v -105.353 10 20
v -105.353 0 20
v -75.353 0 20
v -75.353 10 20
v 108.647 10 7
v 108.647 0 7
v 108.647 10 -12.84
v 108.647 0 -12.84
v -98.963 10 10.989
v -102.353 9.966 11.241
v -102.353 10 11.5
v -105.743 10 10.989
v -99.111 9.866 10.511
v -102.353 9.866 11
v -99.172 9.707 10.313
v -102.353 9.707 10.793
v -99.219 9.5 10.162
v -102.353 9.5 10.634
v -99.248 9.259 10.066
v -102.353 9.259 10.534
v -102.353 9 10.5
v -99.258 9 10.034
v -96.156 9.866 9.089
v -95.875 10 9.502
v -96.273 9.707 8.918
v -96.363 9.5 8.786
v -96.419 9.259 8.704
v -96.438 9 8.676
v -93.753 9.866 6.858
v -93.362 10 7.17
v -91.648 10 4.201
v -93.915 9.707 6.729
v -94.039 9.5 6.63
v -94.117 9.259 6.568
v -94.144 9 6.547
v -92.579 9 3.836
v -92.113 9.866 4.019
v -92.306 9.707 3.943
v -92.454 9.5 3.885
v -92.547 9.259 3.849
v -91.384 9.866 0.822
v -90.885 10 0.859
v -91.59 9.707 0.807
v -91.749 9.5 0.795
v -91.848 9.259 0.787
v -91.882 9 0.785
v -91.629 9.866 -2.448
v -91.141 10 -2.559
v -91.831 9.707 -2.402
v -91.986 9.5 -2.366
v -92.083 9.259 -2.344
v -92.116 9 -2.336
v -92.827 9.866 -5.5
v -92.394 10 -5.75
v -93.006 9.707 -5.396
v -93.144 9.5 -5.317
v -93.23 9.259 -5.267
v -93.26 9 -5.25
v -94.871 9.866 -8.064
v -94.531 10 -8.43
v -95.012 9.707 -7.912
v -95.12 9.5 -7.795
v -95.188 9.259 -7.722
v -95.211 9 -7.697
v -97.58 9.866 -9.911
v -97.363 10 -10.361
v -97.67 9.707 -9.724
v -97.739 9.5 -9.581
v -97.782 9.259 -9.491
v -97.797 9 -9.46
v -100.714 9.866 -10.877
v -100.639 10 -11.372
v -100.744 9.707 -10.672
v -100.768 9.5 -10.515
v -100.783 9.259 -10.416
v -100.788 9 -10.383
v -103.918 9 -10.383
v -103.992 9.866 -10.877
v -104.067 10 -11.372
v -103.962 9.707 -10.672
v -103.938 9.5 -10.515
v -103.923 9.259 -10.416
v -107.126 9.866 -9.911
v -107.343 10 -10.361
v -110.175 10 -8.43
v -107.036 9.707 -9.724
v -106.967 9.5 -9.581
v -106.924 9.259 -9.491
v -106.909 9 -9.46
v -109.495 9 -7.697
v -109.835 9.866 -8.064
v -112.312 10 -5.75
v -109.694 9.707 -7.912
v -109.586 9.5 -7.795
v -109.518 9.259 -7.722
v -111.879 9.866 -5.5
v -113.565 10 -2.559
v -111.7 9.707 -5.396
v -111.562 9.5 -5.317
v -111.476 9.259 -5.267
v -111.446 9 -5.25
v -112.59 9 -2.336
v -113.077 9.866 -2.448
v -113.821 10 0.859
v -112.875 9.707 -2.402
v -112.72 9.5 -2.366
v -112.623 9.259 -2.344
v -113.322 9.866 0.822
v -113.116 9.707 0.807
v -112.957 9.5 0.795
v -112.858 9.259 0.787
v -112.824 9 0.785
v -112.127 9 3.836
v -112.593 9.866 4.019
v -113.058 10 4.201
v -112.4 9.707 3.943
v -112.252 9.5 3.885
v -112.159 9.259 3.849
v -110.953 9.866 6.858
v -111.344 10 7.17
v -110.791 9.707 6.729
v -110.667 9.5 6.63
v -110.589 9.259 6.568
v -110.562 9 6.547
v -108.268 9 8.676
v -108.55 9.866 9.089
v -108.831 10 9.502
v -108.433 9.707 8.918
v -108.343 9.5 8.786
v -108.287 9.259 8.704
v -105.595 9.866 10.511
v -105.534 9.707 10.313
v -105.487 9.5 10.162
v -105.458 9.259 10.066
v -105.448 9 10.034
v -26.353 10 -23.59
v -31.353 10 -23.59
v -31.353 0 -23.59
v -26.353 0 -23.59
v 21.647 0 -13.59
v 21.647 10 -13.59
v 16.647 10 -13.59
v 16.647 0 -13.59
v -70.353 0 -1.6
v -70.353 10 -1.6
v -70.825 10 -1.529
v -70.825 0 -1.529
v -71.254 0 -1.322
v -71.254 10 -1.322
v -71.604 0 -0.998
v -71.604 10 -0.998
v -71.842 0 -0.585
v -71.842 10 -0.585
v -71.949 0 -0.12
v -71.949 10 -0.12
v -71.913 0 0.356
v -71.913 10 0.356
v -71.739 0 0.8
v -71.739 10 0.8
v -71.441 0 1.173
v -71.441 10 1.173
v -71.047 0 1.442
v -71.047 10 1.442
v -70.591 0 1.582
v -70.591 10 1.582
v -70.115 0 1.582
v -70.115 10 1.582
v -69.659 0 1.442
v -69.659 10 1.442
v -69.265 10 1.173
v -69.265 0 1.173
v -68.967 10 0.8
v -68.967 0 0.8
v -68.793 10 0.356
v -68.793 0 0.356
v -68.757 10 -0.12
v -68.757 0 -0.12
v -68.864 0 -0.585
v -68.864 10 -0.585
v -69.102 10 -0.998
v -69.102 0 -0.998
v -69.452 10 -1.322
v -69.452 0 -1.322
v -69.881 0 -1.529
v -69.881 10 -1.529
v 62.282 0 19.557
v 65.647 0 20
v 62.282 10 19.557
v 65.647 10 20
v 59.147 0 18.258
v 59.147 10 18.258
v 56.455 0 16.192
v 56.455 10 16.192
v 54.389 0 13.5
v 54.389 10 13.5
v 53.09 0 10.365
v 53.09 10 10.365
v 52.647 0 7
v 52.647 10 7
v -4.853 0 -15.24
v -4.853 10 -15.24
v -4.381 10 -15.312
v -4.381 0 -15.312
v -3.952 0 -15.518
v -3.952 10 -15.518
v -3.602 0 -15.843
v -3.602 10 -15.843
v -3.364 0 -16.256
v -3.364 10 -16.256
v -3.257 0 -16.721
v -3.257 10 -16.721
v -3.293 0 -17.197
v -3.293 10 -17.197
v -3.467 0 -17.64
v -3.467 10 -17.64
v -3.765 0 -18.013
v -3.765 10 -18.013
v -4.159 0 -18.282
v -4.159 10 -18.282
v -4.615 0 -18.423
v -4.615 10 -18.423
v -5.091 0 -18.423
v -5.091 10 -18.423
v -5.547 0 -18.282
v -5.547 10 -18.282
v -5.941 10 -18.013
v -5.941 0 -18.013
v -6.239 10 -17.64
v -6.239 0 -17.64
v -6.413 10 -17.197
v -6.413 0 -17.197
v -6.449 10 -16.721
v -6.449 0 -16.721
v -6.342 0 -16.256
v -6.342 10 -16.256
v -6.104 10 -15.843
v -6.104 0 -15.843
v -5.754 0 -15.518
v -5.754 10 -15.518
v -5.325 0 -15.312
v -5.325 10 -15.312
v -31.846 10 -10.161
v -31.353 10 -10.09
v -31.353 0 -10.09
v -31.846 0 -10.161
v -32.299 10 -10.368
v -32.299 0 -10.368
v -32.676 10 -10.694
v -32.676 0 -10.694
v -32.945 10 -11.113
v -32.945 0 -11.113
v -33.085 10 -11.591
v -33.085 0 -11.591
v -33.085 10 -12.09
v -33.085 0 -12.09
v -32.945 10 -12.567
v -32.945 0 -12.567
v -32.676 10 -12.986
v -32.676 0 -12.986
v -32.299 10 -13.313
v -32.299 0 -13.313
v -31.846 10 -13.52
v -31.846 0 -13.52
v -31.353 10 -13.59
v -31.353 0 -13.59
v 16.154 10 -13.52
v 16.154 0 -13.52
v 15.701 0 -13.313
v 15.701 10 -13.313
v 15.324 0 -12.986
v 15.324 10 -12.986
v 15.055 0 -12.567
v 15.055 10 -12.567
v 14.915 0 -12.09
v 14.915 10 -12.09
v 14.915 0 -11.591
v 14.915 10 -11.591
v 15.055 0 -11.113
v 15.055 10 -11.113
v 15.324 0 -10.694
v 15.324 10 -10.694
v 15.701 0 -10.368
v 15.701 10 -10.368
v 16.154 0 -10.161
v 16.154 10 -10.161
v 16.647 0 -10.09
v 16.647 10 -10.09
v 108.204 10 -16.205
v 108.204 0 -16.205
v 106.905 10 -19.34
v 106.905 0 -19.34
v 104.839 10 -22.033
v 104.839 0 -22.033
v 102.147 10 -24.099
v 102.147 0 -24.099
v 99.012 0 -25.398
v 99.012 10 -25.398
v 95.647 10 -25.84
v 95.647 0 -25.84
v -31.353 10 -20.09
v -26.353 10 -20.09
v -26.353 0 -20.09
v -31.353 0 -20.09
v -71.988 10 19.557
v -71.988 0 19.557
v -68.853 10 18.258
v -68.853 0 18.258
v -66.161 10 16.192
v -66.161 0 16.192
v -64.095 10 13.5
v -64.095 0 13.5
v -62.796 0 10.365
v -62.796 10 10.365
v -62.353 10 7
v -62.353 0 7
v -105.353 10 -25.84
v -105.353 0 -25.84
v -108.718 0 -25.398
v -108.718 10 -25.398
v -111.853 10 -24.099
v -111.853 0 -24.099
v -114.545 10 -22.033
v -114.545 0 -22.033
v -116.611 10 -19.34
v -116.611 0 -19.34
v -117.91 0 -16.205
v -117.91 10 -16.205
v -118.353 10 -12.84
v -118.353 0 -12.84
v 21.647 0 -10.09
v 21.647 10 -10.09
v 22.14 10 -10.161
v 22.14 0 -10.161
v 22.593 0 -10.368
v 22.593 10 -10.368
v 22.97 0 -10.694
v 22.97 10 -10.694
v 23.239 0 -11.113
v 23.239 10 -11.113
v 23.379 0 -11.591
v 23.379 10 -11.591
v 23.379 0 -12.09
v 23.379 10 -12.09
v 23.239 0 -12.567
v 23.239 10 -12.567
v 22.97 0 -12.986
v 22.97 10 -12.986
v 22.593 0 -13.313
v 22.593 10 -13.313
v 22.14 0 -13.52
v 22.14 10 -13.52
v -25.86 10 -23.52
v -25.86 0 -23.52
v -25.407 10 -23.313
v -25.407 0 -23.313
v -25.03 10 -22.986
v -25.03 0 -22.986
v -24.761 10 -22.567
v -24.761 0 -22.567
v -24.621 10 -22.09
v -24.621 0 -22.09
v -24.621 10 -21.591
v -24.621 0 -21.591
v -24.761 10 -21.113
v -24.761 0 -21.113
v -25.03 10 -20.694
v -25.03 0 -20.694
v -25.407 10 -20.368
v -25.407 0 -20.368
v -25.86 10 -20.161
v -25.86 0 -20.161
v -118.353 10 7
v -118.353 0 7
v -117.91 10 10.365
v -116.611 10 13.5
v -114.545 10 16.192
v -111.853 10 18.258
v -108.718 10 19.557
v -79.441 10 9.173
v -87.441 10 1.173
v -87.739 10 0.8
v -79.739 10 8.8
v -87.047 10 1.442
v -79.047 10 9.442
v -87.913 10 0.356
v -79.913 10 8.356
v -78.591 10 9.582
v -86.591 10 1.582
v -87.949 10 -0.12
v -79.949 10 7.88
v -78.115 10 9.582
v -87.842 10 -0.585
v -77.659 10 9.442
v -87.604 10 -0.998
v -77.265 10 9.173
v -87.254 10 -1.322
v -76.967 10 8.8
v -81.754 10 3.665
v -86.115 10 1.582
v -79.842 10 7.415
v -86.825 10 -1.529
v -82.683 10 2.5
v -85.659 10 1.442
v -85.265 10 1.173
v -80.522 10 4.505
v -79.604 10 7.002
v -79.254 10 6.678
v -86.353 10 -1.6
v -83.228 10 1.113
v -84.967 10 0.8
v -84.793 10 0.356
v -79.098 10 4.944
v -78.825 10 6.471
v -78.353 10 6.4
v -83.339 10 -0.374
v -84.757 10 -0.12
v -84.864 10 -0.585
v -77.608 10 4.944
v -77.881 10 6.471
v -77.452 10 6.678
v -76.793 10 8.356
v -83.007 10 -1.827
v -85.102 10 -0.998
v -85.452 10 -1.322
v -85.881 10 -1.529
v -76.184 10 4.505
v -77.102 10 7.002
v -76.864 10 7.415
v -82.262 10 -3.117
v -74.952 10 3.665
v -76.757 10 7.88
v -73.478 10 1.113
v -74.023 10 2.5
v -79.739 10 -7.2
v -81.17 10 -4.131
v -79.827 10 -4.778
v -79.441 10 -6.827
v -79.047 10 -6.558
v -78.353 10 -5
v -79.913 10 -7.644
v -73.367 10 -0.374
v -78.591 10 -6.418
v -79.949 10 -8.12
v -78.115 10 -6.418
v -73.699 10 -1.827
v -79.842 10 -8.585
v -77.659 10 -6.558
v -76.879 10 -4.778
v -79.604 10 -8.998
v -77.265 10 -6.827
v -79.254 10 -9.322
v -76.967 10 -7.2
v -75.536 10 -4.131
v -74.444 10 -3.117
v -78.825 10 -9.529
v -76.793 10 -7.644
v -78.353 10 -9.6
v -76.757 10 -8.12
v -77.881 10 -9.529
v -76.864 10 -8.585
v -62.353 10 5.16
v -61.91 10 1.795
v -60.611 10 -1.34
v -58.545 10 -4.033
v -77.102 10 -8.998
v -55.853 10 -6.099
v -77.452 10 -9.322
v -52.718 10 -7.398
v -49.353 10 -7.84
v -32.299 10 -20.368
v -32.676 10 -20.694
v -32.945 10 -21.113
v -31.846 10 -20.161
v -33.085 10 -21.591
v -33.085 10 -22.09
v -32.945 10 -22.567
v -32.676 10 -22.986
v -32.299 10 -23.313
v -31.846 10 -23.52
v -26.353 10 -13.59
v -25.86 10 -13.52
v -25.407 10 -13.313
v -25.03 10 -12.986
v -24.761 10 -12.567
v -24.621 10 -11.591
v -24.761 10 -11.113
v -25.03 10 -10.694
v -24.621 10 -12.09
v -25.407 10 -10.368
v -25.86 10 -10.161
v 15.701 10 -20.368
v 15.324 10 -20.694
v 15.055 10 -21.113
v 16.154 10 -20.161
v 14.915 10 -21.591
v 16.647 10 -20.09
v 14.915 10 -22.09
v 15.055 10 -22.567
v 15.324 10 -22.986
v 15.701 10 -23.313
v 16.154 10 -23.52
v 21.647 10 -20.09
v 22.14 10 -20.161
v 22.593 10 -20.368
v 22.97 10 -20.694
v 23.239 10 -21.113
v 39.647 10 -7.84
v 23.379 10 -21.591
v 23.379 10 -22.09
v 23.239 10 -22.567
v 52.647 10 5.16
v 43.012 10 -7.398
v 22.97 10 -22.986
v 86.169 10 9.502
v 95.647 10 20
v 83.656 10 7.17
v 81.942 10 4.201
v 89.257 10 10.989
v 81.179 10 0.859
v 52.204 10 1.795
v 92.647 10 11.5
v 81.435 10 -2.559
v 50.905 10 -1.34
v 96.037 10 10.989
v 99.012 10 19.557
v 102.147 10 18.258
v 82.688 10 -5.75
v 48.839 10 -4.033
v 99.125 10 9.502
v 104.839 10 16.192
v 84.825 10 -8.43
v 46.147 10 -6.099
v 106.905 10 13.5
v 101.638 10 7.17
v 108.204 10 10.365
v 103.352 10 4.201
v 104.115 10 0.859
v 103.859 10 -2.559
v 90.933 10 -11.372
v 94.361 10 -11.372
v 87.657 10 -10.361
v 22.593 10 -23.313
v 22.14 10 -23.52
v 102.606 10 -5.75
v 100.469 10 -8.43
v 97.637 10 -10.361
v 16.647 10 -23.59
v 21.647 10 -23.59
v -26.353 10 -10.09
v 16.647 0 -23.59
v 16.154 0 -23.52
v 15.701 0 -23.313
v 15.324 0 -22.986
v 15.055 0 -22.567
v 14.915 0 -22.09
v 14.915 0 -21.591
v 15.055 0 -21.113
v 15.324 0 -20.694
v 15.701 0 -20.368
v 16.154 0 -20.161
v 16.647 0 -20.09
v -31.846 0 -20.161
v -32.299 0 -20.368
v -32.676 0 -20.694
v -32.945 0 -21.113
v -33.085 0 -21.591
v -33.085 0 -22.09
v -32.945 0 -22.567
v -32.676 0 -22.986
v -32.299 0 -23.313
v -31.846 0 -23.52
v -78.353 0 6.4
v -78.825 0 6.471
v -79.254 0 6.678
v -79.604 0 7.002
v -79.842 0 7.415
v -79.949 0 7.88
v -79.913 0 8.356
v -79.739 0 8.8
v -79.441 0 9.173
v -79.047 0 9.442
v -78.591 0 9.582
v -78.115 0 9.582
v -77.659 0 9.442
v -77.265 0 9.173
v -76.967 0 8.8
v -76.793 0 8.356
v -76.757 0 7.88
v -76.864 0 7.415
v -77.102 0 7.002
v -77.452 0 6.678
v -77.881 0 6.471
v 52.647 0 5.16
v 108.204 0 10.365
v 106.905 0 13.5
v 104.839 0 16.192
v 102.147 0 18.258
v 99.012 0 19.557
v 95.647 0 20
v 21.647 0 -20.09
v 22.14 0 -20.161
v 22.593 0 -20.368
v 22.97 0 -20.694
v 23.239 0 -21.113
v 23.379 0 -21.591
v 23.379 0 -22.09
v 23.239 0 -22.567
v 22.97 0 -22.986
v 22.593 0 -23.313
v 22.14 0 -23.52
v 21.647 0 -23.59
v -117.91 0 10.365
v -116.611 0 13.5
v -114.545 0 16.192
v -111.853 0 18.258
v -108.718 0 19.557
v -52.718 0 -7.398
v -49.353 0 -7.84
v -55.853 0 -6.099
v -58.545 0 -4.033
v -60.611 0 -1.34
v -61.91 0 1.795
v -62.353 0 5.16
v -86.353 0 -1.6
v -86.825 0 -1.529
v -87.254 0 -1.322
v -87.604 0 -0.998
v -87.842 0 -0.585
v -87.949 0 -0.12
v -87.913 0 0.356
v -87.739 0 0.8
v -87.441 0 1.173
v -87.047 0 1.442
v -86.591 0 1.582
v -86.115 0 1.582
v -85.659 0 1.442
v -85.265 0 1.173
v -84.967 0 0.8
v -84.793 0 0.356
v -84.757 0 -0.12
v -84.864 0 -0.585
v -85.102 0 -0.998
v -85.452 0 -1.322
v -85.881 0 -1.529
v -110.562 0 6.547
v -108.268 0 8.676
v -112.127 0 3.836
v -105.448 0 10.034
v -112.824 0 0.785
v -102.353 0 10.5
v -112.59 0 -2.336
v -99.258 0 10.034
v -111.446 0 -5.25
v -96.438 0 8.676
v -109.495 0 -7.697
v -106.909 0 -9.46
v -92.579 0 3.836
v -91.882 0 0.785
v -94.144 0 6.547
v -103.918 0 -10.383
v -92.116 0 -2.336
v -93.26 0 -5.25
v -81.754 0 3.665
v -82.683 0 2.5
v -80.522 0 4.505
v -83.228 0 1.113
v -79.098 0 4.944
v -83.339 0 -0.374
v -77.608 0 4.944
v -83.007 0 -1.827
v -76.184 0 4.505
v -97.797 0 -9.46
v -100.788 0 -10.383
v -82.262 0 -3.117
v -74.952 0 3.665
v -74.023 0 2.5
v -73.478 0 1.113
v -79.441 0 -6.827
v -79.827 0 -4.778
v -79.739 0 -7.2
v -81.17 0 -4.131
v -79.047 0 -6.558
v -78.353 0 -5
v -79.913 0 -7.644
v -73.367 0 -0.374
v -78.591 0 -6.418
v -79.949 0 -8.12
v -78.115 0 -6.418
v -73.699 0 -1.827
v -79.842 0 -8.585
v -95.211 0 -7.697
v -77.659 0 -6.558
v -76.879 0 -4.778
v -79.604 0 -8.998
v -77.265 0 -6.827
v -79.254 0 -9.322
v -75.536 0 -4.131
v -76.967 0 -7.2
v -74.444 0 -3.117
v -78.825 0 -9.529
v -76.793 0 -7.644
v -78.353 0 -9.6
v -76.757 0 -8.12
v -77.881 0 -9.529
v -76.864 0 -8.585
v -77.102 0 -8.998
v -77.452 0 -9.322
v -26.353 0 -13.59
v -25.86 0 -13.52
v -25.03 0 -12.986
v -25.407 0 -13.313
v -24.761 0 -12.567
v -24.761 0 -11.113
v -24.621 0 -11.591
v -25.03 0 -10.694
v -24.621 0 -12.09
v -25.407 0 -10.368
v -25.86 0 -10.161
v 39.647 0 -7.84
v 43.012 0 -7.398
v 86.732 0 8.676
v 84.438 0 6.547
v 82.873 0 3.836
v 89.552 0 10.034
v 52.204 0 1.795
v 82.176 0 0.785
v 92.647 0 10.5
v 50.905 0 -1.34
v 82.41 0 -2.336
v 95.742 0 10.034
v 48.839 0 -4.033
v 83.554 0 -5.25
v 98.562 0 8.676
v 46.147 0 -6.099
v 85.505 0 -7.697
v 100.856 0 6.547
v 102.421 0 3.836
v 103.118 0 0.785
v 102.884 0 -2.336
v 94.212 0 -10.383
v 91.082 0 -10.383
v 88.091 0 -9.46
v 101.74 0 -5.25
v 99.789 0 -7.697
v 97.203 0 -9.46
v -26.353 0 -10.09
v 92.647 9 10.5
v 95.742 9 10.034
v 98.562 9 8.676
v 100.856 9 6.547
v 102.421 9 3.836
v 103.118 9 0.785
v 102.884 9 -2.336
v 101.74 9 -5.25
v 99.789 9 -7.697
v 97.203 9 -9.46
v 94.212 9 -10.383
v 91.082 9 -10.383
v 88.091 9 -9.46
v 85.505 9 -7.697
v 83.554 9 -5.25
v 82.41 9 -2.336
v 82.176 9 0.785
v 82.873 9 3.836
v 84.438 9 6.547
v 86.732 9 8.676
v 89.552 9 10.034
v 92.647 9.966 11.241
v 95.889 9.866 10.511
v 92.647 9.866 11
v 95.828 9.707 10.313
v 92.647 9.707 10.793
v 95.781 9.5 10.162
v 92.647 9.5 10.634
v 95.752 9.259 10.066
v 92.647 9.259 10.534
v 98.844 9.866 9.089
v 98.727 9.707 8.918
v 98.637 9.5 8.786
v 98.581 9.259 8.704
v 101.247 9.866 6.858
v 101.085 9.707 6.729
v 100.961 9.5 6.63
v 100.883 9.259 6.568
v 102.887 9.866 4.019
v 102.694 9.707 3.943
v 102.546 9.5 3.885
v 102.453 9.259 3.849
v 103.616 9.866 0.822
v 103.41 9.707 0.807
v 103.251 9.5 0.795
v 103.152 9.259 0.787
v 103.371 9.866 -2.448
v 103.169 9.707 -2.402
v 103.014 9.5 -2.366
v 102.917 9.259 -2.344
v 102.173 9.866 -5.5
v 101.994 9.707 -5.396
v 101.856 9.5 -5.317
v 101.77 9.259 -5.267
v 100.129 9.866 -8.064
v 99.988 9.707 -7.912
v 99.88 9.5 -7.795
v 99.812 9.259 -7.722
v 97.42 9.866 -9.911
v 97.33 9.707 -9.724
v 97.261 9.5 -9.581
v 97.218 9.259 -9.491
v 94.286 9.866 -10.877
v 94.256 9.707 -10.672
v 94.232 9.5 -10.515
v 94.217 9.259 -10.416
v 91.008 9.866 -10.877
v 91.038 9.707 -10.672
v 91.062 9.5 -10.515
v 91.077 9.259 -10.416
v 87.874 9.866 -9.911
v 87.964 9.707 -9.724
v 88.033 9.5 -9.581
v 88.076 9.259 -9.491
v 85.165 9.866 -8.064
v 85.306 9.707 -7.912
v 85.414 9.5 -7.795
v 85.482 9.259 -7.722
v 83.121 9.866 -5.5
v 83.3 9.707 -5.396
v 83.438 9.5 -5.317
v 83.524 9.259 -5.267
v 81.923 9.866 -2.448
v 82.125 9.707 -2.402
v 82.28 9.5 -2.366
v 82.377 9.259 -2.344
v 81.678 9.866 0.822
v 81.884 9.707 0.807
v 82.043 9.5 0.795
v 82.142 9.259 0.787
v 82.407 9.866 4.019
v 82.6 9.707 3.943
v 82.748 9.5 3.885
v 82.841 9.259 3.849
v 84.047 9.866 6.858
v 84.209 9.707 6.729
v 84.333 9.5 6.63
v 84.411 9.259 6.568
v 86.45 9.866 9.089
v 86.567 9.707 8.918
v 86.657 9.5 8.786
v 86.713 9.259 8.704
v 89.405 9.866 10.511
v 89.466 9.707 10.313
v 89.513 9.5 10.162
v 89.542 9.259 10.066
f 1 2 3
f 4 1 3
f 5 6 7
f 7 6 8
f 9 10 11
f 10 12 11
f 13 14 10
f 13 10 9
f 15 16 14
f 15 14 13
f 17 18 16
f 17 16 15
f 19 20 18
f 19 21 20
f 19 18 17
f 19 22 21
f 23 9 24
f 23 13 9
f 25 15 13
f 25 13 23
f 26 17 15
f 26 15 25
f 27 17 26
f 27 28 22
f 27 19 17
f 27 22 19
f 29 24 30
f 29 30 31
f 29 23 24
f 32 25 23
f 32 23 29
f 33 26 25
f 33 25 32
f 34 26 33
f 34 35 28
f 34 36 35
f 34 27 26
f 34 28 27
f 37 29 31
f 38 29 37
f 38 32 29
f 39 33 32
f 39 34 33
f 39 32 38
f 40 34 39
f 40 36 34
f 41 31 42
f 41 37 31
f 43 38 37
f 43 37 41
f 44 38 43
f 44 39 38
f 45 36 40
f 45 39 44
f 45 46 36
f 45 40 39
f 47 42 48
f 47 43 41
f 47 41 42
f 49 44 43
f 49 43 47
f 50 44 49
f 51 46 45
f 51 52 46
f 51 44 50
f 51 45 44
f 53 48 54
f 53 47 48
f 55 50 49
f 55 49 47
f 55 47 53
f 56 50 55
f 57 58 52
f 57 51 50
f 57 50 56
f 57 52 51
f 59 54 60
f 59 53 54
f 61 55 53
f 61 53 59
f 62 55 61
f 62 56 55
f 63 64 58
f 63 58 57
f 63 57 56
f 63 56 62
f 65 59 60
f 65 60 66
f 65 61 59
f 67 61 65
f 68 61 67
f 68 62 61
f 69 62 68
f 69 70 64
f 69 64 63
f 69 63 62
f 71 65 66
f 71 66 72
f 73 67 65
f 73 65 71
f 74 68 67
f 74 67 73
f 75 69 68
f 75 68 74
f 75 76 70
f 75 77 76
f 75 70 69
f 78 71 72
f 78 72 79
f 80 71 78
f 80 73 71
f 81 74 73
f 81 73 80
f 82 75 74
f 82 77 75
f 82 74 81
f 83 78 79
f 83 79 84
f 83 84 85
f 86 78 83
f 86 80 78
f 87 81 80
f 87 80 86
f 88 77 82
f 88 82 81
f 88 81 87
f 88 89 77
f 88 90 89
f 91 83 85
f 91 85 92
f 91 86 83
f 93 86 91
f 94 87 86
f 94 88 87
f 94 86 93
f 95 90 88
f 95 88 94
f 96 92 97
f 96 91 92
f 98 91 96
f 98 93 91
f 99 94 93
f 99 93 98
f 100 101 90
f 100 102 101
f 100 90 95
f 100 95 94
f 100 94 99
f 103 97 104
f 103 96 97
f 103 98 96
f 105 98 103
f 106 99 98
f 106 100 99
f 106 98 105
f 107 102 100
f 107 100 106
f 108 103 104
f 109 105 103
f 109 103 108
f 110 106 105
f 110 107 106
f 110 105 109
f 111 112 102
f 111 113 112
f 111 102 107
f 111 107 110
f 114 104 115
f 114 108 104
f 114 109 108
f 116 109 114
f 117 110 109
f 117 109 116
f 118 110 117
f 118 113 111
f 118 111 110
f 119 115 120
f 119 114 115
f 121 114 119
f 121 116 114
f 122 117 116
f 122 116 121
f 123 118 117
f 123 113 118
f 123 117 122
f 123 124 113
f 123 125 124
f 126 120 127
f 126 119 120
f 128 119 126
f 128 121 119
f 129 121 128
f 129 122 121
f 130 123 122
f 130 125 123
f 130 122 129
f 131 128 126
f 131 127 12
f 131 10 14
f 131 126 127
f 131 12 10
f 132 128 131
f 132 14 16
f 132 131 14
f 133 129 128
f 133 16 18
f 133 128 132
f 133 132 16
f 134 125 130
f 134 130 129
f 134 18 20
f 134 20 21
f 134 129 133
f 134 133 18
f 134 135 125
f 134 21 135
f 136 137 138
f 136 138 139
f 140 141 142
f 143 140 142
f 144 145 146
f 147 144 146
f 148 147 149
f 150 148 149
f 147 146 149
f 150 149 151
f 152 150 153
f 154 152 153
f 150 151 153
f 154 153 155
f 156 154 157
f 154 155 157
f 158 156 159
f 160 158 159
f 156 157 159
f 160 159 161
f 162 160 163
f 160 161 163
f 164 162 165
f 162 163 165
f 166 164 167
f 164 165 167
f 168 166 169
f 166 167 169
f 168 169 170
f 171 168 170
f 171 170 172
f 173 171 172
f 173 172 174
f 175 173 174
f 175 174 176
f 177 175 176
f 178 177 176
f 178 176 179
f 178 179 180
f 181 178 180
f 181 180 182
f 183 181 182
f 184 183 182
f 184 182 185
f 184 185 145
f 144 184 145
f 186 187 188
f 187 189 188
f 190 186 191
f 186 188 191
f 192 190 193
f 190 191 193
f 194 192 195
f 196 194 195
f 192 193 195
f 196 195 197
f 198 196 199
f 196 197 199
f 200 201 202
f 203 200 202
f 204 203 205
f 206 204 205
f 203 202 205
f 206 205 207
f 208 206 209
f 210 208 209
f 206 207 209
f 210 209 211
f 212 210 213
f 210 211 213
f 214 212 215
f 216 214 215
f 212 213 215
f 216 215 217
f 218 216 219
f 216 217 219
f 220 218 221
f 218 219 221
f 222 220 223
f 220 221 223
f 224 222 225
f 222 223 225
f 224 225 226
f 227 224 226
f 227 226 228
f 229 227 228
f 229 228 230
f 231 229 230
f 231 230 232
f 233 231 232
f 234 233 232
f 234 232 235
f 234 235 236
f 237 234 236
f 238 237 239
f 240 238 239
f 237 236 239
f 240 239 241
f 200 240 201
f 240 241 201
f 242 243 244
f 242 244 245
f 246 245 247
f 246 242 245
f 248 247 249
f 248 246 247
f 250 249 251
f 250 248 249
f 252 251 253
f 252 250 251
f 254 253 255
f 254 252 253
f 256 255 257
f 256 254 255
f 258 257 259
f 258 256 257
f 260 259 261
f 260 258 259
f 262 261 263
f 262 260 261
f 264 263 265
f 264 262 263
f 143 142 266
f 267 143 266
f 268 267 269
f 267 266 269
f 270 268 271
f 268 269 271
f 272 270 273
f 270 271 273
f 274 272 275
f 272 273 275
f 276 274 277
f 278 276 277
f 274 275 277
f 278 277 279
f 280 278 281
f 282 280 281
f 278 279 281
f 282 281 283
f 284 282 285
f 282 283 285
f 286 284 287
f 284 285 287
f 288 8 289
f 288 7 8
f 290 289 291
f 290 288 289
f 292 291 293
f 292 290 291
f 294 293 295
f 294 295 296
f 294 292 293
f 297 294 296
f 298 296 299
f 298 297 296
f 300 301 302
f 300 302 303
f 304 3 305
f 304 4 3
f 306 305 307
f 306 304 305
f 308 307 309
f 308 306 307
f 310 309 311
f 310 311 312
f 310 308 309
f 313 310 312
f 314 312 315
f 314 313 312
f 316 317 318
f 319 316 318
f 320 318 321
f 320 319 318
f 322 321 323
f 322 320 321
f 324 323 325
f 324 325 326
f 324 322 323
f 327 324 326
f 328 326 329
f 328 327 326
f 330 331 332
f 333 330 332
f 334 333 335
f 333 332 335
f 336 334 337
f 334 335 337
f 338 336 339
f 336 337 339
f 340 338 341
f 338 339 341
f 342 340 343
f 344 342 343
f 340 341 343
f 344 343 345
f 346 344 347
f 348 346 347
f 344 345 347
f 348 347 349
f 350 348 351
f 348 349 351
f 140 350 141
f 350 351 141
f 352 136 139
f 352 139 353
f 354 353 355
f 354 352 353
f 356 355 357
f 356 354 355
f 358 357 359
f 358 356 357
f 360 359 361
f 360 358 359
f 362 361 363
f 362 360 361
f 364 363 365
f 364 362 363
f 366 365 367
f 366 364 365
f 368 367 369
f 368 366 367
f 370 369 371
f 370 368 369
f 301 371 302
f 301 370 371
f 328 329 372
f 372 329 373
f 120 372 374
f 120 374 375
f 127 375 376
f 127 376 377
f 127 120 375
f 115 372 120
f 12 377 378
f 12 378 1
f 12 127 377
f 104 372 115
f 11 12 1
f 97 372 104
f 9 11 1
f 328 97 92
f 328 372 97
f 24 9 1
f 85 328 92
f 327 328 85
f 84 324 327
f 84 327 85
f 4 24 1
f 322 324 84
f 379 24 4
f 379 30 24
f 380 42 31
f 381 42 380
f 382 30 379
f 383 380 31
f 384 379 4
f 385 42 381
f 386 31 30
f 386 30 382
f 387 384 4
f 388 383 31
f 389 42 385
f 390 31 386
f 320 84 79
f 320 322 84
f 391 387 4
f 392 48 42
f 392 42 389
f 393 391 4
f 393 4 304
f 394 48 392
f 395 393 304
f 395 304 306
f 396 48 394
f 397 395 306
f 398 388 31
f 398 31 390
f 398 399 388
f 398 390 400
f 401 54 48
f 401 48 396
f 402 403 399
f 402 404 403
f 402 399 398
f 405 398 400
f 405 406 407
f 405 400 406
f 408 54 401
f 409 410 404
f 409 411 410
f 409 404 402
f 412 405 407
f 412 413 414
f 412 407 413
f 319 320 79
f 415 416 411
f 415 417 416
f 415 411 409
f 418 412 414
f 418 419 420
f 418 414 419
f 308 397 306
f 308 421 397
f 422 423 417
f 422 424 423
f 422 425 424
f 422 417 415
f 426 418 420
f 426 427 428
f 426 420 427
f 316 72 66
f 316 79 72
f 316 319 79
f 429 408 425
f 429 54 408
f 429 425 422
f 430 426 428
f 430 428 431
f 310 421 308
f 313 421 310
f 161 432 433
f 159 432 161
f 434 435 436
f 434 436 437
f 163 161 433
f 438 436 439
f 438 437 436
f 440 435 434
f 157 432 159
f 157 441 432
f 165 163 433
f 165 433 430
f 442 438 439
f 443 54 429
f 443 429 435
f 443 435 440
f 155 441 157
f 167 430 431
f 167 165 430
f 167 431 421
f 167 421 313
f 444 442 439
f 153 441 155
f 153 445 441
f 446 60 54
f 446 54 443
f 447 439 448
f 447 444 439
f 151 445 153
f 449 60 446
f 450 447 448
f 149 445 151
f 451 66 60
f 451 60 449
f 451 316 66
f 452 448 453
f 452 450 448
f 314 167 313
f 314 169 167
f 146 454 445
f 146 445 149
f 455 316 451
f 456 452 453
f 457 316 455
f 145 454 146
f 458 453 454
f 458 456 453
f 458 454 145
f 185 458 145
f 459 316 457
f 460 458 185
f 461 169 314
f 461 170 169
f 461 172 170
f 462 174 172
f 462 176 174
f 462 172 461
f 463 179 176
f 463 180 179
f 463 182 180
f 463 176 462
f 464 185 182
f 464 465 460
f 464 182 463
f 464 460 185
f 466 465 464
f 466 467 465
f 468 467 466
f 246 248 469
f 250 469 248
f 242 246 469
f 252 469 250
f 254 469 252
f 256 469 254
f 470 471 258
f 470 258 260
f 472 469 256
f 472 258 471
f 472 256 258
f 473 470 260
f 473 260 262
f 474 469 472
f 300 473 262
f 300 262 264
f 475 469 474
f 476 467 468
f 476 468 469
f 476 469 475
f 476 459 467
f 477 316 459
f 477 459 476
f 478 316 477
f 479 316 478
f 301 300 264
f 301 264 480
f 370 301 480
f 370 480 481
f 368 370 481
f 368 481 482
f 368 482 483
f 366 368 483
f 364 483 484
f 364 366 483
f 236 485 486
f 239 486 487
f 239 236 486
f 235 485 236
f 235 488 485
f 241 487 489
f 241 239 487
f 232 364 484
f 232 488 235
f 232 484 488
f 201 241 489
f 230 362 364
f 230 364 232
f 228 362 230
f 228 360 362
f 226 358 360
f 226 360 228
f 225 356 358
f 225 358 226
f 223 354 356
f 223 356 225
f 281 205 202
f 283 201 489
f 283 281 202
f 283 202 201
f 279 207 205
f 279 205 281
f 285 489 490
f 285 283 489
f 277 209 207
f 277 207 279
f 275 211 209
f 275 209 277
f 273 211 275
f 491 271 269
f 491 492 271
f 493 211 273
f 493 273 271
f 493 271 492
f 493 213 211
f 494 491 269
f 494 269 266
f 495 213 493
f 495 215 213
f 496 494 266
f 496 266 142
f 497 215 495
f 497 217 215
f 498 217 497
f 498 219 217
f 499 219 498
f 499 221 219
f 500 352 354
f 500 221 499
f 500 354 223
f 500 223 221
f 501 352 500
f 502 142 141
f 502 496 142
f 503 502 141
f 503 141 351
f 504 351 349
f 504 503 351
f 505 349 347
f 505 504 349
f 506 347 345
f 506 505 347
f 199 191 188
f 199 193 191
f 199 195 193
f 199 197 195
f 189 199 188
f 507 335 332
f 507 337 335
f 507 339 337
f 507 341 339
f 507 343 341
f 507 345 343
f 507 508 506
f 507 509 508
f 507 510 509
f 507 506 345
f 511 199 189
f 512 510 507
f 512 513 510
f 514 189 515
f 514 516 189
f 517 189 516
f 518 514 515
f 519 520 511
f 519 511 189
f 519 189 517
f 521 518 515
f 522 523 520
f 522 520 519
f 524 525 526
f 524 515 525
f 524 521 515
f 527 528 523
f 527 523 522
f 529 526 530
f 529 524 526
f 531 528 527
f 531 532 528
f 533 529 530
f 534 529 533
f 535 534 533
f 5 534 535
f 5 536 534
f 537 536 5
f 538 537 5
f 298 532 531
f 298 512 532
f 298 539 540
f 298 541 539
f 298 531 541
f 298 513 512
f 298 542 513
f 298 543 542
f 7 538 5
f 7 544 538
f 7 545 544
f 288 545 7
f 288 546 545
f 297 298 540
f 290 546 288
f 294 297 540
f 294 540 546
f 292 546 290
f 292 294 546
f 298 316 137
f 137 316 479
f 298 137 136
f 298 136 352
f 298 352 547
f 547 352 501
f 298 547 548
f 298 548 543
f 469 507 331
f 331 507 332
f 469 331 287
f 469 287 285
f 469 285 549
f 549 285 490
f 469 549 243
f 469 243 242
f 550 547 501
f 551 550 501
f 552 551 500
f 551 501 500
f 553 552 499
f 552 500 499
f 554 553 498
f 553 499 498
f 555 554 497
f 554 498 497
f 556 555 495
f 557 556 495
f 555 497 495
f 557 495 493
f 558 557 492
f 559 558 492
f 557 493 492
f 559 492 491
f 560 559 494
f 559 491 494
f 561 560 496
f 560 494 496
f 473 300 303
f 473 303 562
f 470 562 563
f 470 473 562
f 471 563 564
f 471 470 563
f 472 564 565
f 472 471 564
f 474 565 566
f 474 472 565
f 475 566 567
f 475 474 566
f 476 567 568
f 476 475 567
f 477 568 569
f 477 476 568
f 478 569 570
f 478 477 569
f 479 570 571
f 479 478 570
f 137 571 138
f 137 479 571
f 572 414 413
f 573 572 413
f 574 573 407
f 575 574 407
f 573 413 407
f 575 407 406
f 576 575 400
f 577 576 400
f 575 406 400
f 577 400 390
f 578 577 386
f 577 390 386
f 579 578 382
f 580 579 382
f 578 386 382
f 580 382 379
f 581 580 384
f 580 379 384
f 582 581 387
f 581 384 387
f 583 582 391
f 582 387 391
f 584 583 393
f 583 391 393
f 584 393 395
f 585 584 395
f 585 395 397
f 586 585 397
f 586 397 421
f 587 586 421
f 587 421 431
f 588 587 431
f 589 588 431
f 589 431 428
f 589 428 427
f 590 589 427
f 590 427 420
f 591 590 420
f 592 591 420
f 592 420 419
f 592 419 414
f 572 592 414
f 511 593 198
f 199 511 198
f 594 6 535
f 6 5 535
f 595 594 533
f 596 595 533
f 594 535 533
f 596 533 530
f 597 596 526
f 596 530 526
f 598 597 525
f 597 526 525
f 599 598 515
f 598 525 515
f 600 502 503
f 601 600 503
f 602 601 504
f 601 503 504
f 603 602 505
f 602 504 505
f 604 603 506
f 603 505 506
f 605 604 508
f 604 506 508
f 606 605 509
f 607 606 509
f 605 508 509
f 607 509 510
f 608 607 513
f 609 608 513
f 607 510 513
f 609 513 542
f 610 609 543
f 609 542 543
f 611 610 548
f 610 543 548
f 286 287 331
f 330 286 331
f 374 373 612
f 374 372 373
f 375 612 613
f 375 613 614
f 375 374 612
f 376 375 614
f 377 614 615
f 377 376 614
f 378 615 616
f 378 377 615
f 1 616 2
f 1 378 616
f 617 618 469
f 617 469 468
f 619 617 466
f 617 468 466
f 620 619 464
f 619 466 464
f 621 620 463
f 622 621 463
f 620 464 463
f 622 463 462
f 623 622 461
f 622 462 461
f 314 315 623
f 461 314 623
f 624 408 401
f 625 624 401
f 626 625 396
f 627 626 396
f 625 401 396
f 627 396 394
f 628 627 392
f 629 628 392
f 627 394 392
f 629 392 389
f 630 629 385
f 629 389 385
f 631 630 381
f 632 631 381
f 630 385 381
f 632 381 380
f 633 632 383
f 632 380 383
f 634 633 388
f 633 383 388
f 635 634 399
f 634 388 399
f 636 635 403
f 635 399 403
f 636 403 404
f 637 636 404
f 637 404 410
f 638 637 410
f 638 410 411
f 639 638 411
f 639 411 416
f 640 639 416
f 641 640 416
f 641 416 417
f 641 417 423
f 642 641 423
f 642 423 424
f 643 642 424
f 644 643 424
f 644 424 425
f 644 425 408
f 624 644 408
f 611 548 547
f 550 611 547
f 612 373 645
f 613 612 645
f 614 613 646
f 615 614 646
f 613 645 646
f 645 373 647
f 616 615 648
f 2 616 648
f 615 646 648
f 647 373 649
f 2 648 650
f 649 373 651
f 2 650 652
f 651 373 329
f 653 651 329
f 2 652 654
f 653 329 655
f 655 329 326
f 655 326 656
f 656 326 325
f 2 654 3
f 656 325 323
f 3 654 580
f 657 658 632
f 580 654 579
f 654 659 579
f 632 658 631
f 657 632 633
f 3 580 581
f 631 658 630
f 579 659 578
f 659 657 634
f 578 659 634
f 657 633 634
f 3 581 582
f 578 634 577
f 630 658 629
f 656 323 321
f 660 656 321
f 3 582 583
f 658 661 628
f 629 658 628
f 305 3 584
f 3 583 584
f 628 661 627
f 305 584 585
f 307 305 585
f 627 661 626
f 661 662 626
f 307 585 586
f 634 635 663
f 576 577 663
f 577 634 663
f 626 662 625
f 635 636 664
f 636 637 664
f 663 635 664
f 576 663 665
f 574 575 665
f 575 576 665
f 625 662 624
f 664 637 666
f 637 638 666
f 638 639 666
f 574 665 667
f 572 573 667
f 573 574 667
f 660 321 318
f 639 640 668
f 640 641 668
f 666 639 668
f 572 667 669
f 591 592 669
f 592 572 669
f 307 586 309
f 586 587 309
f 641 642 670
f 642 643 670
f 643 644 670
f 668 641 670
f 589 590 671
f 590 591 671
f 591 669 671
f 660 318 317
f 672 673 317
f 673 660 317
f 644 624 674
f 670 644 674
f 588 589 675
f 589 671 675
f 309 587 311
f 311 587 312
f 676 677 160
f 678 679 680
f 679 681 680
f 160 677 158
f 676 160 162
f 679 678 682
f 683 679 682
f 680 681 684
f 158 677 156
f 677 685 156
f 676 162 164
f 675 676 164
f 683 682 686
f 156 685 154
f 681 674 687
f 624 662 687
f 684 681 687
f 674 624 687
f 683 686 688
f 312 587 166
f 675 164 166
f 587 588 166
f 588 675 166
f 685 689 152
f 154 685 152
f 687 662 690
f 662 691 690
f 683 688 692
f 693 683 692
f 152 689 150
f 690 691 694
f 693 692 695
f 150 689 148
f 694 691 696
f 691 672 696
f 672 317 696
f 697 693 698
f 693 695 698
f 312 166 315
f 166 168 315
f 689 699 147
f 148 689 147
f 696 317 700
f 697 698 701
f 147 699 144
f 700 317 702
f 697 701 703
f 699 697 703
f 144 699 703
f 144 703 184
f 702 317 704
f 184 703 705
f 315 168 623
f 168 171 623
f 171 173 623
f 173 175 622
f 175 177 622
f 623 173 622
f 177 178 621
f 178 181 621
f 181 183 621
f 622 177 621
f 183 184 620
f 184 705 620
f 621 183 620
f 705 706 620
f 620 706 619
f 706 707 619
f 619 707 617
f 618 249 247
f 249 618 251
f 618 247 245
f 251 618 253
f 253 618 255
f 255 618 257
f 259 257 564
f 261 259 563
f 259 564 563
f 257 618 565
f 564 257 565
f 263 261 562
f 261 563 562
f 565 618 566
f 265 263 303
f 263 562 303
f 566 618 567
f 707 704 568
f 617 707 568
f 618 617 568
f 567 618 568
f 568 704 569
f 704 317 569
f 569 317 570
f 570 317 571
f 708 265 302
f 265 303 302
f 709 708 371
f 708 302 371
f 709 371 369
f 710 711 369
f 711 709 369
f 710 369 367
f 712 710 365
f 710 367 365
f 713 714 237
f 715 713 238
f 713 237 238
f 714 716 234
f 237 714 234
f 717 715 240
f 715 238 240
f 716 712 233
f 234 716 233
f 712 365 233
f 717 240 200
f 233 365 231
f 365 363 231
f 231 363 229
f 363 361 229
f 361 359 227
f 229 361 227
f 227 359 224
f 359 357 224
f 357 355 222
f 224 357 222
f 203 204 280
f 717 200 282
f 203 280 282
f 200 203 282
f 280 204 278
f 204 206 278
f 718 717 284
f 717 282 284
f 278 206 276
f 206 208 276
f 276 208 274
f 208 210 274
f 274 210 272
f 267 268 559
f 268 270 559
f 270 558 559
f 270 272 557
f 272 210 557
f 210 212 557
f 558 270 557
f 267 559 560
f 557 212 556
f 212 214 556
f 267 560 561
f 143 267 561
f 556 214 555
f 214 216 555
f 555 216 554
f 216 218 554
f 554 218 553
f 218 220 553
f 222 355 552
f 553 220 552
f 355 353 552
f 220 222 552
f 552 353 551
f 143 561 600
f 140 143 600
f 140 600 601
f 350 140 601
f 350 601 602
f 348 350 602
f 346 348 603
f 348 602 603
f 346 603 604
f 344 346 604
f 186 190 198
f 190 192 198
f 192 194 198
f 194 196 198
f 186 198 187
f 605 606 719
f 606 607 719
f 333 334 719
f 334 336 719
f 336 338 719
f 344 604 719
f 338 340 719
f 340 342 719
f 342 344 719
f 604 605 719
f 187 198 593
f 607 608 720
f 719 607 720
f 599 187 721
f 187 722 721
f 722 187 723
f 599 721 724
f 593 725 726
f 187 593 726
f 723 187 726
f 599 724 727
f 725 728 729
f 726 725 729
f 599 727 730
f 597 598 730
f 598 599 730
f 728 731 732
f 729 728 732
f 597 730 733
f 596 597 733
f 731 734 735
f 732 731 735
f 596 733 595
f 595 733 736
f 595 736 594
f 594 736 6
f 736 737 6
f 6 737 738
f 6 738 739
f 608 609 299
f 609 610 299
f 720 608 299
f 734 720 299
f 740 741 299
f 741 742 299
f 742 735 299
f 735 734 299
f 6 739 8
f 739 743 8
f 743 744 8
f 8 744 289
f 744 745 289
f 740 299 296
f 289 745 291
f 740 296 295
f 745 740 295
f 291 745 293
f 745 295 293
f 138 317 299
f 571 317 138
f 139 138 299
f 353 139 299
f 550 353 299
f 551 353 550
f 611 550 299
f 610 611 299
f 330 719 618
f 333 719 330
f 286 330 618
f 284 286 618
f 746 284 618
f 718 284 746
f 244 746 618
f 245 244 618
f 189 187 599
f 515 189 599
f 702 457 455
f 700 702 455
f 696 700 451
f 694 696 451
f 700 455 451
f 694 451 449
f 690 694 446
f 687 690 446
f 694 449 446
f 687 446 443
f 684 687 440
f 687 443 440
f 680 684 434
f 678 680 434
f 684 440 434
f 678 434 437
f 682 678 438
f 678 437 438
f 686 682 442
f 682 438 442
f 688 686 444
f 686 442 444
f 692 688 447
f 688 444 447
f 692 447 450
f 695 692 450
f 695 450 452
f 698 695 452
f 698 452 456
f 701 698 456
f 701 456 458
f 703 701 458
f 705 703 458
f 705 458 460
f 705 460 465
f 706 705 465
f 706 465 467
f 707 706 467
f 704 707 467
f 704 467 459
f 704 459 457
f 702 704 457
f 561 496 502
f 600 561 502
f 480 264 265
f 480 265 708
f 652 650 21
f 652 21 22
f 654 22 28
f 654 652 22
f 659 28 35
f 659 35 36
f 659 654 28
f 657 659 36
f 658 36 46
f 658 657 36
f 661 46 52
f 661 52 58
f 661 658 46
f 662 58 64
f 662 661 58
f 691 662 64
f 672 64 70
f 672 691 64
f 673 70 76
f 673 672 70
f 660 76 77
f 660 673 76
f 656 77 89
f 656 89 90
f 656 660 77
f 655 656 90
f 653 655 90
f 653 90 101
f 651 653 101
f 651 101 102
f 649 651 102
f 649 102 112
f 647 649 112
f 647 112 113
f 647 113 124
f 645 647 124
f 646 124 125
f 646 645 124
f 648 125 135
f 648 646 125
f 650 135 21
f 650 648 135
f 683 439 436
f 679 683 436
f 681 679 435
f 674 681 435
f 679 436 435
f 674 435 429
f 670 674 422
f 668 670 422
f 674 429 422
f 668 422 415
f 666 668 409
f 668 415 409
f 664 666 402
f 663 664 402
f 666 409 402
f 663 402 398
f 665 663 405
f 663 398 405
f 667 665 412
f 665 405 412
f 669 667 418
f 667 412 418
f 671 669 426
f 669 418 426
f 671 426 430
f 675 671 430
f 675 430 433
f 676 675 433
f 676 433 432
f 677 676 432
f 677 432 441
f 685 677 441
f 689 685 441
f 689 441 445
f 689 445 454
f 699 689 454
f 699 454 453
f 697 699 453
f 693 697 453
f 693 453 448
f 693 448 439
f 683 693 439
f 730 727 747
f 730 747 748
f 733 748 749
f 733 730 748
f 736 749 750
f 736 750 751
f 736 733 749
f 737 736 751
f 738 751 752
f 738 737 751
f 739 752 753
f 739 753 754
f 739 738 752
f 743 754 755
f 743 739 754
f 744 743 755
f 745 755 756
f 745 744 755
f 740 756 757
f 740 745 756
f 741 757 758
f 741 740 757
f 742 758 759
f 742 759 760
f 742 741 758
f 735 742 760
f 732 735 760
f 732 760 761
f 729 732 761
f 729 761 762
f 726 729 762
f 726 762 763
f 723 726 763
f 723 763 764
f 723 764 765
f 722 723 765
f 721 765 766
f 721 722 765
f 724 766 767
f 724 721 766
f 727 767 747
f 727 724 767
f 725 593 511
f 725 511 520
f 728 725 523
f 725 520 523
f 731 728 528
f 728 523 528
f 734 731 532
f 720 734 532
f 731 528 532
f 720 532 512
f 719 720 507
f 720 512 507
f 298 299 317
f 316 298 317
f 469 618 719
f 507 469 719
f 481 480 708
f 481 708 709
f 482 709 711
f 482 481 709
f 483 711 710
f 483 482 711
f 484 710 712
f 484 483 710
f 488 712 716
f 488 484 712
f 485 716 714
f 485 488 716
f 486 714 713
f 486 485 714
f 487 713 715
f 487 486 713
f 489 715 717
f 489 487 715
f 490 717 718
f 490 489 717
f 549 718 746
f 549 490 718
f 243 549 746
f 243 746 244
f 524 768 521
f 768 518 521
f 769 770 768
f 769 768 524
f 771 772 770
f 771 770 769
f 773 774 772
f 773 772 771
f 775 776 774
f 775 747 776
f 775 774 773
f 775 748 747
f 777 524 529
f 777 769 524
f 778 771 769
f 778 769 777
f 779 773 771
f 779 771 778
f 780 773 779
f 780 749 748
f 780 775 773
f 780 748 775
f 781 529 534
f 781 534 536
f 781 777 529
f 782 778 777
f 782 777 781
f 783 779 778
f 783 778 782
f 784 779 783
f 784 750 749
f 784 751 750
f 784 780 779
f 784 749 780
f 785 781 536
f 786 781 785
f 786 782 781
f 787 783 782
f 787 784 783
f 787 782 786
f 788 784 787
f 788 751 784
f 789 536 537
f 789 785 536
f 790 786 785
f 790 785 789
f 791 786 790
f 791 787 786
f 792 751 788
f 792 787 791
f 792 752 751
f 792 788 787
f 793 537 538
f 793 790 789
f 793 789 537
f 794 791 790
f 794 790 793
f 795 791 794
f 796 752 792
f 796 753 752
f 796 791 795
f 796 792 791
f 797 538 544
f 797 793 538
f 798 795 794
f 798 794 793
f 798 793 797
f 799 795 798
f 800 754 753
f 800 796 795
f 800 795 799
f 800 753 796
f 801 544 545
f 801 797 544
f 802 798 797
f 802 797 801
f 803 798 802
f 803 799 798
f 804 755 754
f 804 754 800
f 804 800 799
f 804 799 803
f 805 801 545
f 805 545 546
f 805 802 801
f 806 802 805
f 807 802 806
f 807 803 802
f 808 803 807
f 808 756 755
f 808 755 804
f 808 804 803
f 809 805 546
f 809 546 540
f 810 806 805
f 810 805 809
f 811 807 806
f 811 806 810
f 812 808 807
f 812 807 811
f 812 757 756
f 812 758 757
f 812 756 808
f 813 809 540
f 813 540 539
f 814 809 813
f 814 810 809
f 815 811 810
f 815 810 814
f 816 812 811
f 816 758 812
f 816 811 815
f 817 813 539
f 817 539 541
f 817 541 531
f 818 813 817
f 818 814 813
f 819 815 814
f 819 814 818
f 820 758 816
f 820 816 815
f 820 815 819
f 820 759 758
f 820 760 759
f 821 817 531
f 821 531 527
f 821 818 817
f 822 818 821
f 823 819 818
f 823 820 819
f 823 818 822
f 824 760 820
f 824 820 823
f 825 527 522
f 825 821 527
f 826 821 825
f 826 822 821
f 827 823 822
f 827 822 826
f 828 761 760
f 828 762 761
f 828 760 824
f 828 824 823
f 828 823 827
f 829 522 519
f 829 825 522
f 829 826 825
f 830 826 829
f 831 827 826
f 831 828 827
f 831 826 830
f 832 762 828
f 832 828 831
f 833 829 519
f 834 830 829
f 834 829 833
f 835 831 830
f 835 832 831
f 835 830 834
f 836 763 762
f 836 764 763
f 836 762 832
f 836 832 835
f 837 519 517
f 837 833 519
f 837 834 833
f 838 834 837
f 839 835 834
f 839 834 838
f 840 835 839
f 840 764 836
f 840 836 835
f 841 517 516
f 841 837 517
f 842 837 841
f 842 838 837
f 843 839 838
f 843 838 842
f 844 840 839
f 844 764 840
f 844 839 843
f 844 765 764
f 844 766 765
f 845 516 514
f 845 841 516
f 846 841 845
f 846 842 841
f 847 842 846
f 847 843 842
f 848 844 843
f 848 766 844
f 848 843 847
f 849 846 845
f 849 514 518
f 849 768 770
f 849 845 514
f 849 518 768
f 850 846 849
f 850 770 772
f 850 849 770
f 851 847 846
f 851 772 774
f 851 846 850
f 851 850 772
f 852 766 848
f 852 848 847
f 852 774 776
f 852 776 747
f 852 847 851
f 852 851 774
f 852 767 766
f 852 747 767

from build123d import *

# Parameters (mm, degrees)
SKETCH1_R           = 10.5
BOSS_EXTRUDE1_DEPTH = 10
FILLET1_R           = 13
SKETCH8_R           = 1.6
SKETCH8_R_2         = 5
CUT_EXTRUDE5_DEPTH  = 122.553128346
SKETCH4_R           = 1.6
CUT_EXTRUDE6_DEPTH  = 10
FILLET2_R           = 1


with BuildPart() as part:
    # Sketch1 → Boss-Extrude1 (new body)
    with BuildSketch(Plane(origin=(0, 0, 0), x_dir=(1, 0, 0), z_dir=(0, 1, 0))):
        Polygon((108.646998451, -20), (108.646998451, 25.840472806), (-118.353001549, 25.840472806), (-118.353001549, -20), (-62.353001549, -20), (-62.353001549, 7.840472806), (52.646998451, 7.840472806), (52.646998451, -20), align=None)
        with Locations(Location((92.646998451, 0, 0), (0, 0, 270))):
            Circle(SKETCH1_R, mode=Mode.SUBTRACT)
        with Locations(Location((-102.353001549, 0, 0), (0, 0, 270))):
            Circle(SKETCH1_R, mode=Mode.SUBTRACT)
    extrude(amount=BOSS_EXTRUDE1_DEPTH)

    # Fillet1
    fillet1_edges = [part.edges().sort_by_distance(p)[0] for p in [
        (108.646998451, 5, -25.840472806),
        (108.646998451, 5, 20),
        (52.646998451, 5, 20),
        (52.646998451, 5, -7.840472806),
        (-62.353001549, 5, -7.840472806),
        (-62.353001549, 5, 20),
        (-118.353001549, 5, 20),
        (-118.353001549, 5, -25.840472806),
    ]]
    fillet(fillet1_edges, radius=FILLET1_R)

    # Sketch8 → Cut-Extrude5 (cut, through all)
    with BuildSketch(Plane(origin=(0, 10, 0), x_dir=(1, 0, 0), z_dir=(0, 1, 0))):
        with Locations(Location((-86.353001549, 0, 0), (0, 0, 90))):
            Circle(SKETCH8_R)
        with Locations(Location((-78.353001549, 0, 0), (0, 0, 90))):
            Circle(SKETCH8_R_2)
        with Locations(Location((-78.353001549, -8, 0), (0, 0, 90))):
            Circle(SKETCH8_R)
        with Locations(Location((-70.353001549, 0, 0), (0, 0, 90))):
            Circle(SKETCH8_R)
        with Locations(Location((-78.353001549, 8, 0), (0, 0, 90))):
            Circle(SKETCH8_R)
        with BuildLine():
            Line((-31.353001549, 23.590472806), (-26.353001549, 23.590472806))
            ThreePointArc((-26.353001549, 23.590472806), (-24.603001549, 21.840472806), (-26.353001549, 20.090472806))
            Line((-26.353001549, 20.090472806), (-31.353001549, 20.090472806))
            ThreePointArc((-31.353001549, 20.090472806), (-33.103001549, 21.840472806), (-31.353001549, 23.590472806))
        make_face()
        with BuildLine():
            Line((-31.353001549, 13.590472806), (-26.353001549, 13.590472806))
            ThreePointArc((-26.353001549, 13.590472806), (-24.603001549, 11.840472806), (-26.353001549, 10.090472806))
            Line((-26.353001549, 10.090472806), (-31.353001549, 10.090472806))
            ThreePointArc((-31.353001549, 10.090472806), (-33.103001549, 11.840472806), (-31.353001549, 13.590472806))
        make_face()
        with BuildLine():
            Line((21.646998451, 13.590472806), (16.646998451, 13.590472806))
            ThreePointArc((16.646998451, 13.590472806), (14.896998451, 11.840472806), (16.646998451, 10.090472806))
            Line((16.646998451, 10.090472806), (21.646998451, 10.090472806))
            ThreePointArc((21.646998451, 10.090472806), (23.396998451, 11.840472806), (21.646998451, 13.590472806))
        make_face()
        with BuildLine():
            Line((21.646998451, 23.590472806), (16.646998451, 23.590472806))
            ThreePointArc((16.646998451, 23.590472806), (14.896998451, 21.840472806), (16.646998451, 20.090472806))
            Line((16.646998451, 20.090472806), (21.646998451, 20.090472806))
            ThreePointArc((21.646998451, 20.090472806), (23.396998451, 21.840472806), (21.646998451, 23.590472806))
        make_face()
    extrude(amount=-CUT_EXTRUDE5_DEPTH, mode=Mode.SUBTRACT)

    # Sketch4 → Cut-Extrude6 (cut)
    with BuildSketch(Plane(origin=(0, 10, 0), x_dir=(1, 0, 0), z_dir=(0, 1, 0))):
        with Locations(Location((-4.853001549, 16.840472806, 0), (0, 0, 270))):
            Circle(SKETCH4_R)
    extrude(amount=-CUT_EXTRUDE6_DEPTH, mode=Mode.SUBTRACT)

    # Fillet2
    fillet2_edges = [part.edges().sort_by_distance(p)[0] for p in [
        (92.646998451, 10, -10.5),
        (-102.353001549, 10, -10.5),
    ]]
    fillet(fillet2_edges, radius=FILLET2_R)


solid = part.part
